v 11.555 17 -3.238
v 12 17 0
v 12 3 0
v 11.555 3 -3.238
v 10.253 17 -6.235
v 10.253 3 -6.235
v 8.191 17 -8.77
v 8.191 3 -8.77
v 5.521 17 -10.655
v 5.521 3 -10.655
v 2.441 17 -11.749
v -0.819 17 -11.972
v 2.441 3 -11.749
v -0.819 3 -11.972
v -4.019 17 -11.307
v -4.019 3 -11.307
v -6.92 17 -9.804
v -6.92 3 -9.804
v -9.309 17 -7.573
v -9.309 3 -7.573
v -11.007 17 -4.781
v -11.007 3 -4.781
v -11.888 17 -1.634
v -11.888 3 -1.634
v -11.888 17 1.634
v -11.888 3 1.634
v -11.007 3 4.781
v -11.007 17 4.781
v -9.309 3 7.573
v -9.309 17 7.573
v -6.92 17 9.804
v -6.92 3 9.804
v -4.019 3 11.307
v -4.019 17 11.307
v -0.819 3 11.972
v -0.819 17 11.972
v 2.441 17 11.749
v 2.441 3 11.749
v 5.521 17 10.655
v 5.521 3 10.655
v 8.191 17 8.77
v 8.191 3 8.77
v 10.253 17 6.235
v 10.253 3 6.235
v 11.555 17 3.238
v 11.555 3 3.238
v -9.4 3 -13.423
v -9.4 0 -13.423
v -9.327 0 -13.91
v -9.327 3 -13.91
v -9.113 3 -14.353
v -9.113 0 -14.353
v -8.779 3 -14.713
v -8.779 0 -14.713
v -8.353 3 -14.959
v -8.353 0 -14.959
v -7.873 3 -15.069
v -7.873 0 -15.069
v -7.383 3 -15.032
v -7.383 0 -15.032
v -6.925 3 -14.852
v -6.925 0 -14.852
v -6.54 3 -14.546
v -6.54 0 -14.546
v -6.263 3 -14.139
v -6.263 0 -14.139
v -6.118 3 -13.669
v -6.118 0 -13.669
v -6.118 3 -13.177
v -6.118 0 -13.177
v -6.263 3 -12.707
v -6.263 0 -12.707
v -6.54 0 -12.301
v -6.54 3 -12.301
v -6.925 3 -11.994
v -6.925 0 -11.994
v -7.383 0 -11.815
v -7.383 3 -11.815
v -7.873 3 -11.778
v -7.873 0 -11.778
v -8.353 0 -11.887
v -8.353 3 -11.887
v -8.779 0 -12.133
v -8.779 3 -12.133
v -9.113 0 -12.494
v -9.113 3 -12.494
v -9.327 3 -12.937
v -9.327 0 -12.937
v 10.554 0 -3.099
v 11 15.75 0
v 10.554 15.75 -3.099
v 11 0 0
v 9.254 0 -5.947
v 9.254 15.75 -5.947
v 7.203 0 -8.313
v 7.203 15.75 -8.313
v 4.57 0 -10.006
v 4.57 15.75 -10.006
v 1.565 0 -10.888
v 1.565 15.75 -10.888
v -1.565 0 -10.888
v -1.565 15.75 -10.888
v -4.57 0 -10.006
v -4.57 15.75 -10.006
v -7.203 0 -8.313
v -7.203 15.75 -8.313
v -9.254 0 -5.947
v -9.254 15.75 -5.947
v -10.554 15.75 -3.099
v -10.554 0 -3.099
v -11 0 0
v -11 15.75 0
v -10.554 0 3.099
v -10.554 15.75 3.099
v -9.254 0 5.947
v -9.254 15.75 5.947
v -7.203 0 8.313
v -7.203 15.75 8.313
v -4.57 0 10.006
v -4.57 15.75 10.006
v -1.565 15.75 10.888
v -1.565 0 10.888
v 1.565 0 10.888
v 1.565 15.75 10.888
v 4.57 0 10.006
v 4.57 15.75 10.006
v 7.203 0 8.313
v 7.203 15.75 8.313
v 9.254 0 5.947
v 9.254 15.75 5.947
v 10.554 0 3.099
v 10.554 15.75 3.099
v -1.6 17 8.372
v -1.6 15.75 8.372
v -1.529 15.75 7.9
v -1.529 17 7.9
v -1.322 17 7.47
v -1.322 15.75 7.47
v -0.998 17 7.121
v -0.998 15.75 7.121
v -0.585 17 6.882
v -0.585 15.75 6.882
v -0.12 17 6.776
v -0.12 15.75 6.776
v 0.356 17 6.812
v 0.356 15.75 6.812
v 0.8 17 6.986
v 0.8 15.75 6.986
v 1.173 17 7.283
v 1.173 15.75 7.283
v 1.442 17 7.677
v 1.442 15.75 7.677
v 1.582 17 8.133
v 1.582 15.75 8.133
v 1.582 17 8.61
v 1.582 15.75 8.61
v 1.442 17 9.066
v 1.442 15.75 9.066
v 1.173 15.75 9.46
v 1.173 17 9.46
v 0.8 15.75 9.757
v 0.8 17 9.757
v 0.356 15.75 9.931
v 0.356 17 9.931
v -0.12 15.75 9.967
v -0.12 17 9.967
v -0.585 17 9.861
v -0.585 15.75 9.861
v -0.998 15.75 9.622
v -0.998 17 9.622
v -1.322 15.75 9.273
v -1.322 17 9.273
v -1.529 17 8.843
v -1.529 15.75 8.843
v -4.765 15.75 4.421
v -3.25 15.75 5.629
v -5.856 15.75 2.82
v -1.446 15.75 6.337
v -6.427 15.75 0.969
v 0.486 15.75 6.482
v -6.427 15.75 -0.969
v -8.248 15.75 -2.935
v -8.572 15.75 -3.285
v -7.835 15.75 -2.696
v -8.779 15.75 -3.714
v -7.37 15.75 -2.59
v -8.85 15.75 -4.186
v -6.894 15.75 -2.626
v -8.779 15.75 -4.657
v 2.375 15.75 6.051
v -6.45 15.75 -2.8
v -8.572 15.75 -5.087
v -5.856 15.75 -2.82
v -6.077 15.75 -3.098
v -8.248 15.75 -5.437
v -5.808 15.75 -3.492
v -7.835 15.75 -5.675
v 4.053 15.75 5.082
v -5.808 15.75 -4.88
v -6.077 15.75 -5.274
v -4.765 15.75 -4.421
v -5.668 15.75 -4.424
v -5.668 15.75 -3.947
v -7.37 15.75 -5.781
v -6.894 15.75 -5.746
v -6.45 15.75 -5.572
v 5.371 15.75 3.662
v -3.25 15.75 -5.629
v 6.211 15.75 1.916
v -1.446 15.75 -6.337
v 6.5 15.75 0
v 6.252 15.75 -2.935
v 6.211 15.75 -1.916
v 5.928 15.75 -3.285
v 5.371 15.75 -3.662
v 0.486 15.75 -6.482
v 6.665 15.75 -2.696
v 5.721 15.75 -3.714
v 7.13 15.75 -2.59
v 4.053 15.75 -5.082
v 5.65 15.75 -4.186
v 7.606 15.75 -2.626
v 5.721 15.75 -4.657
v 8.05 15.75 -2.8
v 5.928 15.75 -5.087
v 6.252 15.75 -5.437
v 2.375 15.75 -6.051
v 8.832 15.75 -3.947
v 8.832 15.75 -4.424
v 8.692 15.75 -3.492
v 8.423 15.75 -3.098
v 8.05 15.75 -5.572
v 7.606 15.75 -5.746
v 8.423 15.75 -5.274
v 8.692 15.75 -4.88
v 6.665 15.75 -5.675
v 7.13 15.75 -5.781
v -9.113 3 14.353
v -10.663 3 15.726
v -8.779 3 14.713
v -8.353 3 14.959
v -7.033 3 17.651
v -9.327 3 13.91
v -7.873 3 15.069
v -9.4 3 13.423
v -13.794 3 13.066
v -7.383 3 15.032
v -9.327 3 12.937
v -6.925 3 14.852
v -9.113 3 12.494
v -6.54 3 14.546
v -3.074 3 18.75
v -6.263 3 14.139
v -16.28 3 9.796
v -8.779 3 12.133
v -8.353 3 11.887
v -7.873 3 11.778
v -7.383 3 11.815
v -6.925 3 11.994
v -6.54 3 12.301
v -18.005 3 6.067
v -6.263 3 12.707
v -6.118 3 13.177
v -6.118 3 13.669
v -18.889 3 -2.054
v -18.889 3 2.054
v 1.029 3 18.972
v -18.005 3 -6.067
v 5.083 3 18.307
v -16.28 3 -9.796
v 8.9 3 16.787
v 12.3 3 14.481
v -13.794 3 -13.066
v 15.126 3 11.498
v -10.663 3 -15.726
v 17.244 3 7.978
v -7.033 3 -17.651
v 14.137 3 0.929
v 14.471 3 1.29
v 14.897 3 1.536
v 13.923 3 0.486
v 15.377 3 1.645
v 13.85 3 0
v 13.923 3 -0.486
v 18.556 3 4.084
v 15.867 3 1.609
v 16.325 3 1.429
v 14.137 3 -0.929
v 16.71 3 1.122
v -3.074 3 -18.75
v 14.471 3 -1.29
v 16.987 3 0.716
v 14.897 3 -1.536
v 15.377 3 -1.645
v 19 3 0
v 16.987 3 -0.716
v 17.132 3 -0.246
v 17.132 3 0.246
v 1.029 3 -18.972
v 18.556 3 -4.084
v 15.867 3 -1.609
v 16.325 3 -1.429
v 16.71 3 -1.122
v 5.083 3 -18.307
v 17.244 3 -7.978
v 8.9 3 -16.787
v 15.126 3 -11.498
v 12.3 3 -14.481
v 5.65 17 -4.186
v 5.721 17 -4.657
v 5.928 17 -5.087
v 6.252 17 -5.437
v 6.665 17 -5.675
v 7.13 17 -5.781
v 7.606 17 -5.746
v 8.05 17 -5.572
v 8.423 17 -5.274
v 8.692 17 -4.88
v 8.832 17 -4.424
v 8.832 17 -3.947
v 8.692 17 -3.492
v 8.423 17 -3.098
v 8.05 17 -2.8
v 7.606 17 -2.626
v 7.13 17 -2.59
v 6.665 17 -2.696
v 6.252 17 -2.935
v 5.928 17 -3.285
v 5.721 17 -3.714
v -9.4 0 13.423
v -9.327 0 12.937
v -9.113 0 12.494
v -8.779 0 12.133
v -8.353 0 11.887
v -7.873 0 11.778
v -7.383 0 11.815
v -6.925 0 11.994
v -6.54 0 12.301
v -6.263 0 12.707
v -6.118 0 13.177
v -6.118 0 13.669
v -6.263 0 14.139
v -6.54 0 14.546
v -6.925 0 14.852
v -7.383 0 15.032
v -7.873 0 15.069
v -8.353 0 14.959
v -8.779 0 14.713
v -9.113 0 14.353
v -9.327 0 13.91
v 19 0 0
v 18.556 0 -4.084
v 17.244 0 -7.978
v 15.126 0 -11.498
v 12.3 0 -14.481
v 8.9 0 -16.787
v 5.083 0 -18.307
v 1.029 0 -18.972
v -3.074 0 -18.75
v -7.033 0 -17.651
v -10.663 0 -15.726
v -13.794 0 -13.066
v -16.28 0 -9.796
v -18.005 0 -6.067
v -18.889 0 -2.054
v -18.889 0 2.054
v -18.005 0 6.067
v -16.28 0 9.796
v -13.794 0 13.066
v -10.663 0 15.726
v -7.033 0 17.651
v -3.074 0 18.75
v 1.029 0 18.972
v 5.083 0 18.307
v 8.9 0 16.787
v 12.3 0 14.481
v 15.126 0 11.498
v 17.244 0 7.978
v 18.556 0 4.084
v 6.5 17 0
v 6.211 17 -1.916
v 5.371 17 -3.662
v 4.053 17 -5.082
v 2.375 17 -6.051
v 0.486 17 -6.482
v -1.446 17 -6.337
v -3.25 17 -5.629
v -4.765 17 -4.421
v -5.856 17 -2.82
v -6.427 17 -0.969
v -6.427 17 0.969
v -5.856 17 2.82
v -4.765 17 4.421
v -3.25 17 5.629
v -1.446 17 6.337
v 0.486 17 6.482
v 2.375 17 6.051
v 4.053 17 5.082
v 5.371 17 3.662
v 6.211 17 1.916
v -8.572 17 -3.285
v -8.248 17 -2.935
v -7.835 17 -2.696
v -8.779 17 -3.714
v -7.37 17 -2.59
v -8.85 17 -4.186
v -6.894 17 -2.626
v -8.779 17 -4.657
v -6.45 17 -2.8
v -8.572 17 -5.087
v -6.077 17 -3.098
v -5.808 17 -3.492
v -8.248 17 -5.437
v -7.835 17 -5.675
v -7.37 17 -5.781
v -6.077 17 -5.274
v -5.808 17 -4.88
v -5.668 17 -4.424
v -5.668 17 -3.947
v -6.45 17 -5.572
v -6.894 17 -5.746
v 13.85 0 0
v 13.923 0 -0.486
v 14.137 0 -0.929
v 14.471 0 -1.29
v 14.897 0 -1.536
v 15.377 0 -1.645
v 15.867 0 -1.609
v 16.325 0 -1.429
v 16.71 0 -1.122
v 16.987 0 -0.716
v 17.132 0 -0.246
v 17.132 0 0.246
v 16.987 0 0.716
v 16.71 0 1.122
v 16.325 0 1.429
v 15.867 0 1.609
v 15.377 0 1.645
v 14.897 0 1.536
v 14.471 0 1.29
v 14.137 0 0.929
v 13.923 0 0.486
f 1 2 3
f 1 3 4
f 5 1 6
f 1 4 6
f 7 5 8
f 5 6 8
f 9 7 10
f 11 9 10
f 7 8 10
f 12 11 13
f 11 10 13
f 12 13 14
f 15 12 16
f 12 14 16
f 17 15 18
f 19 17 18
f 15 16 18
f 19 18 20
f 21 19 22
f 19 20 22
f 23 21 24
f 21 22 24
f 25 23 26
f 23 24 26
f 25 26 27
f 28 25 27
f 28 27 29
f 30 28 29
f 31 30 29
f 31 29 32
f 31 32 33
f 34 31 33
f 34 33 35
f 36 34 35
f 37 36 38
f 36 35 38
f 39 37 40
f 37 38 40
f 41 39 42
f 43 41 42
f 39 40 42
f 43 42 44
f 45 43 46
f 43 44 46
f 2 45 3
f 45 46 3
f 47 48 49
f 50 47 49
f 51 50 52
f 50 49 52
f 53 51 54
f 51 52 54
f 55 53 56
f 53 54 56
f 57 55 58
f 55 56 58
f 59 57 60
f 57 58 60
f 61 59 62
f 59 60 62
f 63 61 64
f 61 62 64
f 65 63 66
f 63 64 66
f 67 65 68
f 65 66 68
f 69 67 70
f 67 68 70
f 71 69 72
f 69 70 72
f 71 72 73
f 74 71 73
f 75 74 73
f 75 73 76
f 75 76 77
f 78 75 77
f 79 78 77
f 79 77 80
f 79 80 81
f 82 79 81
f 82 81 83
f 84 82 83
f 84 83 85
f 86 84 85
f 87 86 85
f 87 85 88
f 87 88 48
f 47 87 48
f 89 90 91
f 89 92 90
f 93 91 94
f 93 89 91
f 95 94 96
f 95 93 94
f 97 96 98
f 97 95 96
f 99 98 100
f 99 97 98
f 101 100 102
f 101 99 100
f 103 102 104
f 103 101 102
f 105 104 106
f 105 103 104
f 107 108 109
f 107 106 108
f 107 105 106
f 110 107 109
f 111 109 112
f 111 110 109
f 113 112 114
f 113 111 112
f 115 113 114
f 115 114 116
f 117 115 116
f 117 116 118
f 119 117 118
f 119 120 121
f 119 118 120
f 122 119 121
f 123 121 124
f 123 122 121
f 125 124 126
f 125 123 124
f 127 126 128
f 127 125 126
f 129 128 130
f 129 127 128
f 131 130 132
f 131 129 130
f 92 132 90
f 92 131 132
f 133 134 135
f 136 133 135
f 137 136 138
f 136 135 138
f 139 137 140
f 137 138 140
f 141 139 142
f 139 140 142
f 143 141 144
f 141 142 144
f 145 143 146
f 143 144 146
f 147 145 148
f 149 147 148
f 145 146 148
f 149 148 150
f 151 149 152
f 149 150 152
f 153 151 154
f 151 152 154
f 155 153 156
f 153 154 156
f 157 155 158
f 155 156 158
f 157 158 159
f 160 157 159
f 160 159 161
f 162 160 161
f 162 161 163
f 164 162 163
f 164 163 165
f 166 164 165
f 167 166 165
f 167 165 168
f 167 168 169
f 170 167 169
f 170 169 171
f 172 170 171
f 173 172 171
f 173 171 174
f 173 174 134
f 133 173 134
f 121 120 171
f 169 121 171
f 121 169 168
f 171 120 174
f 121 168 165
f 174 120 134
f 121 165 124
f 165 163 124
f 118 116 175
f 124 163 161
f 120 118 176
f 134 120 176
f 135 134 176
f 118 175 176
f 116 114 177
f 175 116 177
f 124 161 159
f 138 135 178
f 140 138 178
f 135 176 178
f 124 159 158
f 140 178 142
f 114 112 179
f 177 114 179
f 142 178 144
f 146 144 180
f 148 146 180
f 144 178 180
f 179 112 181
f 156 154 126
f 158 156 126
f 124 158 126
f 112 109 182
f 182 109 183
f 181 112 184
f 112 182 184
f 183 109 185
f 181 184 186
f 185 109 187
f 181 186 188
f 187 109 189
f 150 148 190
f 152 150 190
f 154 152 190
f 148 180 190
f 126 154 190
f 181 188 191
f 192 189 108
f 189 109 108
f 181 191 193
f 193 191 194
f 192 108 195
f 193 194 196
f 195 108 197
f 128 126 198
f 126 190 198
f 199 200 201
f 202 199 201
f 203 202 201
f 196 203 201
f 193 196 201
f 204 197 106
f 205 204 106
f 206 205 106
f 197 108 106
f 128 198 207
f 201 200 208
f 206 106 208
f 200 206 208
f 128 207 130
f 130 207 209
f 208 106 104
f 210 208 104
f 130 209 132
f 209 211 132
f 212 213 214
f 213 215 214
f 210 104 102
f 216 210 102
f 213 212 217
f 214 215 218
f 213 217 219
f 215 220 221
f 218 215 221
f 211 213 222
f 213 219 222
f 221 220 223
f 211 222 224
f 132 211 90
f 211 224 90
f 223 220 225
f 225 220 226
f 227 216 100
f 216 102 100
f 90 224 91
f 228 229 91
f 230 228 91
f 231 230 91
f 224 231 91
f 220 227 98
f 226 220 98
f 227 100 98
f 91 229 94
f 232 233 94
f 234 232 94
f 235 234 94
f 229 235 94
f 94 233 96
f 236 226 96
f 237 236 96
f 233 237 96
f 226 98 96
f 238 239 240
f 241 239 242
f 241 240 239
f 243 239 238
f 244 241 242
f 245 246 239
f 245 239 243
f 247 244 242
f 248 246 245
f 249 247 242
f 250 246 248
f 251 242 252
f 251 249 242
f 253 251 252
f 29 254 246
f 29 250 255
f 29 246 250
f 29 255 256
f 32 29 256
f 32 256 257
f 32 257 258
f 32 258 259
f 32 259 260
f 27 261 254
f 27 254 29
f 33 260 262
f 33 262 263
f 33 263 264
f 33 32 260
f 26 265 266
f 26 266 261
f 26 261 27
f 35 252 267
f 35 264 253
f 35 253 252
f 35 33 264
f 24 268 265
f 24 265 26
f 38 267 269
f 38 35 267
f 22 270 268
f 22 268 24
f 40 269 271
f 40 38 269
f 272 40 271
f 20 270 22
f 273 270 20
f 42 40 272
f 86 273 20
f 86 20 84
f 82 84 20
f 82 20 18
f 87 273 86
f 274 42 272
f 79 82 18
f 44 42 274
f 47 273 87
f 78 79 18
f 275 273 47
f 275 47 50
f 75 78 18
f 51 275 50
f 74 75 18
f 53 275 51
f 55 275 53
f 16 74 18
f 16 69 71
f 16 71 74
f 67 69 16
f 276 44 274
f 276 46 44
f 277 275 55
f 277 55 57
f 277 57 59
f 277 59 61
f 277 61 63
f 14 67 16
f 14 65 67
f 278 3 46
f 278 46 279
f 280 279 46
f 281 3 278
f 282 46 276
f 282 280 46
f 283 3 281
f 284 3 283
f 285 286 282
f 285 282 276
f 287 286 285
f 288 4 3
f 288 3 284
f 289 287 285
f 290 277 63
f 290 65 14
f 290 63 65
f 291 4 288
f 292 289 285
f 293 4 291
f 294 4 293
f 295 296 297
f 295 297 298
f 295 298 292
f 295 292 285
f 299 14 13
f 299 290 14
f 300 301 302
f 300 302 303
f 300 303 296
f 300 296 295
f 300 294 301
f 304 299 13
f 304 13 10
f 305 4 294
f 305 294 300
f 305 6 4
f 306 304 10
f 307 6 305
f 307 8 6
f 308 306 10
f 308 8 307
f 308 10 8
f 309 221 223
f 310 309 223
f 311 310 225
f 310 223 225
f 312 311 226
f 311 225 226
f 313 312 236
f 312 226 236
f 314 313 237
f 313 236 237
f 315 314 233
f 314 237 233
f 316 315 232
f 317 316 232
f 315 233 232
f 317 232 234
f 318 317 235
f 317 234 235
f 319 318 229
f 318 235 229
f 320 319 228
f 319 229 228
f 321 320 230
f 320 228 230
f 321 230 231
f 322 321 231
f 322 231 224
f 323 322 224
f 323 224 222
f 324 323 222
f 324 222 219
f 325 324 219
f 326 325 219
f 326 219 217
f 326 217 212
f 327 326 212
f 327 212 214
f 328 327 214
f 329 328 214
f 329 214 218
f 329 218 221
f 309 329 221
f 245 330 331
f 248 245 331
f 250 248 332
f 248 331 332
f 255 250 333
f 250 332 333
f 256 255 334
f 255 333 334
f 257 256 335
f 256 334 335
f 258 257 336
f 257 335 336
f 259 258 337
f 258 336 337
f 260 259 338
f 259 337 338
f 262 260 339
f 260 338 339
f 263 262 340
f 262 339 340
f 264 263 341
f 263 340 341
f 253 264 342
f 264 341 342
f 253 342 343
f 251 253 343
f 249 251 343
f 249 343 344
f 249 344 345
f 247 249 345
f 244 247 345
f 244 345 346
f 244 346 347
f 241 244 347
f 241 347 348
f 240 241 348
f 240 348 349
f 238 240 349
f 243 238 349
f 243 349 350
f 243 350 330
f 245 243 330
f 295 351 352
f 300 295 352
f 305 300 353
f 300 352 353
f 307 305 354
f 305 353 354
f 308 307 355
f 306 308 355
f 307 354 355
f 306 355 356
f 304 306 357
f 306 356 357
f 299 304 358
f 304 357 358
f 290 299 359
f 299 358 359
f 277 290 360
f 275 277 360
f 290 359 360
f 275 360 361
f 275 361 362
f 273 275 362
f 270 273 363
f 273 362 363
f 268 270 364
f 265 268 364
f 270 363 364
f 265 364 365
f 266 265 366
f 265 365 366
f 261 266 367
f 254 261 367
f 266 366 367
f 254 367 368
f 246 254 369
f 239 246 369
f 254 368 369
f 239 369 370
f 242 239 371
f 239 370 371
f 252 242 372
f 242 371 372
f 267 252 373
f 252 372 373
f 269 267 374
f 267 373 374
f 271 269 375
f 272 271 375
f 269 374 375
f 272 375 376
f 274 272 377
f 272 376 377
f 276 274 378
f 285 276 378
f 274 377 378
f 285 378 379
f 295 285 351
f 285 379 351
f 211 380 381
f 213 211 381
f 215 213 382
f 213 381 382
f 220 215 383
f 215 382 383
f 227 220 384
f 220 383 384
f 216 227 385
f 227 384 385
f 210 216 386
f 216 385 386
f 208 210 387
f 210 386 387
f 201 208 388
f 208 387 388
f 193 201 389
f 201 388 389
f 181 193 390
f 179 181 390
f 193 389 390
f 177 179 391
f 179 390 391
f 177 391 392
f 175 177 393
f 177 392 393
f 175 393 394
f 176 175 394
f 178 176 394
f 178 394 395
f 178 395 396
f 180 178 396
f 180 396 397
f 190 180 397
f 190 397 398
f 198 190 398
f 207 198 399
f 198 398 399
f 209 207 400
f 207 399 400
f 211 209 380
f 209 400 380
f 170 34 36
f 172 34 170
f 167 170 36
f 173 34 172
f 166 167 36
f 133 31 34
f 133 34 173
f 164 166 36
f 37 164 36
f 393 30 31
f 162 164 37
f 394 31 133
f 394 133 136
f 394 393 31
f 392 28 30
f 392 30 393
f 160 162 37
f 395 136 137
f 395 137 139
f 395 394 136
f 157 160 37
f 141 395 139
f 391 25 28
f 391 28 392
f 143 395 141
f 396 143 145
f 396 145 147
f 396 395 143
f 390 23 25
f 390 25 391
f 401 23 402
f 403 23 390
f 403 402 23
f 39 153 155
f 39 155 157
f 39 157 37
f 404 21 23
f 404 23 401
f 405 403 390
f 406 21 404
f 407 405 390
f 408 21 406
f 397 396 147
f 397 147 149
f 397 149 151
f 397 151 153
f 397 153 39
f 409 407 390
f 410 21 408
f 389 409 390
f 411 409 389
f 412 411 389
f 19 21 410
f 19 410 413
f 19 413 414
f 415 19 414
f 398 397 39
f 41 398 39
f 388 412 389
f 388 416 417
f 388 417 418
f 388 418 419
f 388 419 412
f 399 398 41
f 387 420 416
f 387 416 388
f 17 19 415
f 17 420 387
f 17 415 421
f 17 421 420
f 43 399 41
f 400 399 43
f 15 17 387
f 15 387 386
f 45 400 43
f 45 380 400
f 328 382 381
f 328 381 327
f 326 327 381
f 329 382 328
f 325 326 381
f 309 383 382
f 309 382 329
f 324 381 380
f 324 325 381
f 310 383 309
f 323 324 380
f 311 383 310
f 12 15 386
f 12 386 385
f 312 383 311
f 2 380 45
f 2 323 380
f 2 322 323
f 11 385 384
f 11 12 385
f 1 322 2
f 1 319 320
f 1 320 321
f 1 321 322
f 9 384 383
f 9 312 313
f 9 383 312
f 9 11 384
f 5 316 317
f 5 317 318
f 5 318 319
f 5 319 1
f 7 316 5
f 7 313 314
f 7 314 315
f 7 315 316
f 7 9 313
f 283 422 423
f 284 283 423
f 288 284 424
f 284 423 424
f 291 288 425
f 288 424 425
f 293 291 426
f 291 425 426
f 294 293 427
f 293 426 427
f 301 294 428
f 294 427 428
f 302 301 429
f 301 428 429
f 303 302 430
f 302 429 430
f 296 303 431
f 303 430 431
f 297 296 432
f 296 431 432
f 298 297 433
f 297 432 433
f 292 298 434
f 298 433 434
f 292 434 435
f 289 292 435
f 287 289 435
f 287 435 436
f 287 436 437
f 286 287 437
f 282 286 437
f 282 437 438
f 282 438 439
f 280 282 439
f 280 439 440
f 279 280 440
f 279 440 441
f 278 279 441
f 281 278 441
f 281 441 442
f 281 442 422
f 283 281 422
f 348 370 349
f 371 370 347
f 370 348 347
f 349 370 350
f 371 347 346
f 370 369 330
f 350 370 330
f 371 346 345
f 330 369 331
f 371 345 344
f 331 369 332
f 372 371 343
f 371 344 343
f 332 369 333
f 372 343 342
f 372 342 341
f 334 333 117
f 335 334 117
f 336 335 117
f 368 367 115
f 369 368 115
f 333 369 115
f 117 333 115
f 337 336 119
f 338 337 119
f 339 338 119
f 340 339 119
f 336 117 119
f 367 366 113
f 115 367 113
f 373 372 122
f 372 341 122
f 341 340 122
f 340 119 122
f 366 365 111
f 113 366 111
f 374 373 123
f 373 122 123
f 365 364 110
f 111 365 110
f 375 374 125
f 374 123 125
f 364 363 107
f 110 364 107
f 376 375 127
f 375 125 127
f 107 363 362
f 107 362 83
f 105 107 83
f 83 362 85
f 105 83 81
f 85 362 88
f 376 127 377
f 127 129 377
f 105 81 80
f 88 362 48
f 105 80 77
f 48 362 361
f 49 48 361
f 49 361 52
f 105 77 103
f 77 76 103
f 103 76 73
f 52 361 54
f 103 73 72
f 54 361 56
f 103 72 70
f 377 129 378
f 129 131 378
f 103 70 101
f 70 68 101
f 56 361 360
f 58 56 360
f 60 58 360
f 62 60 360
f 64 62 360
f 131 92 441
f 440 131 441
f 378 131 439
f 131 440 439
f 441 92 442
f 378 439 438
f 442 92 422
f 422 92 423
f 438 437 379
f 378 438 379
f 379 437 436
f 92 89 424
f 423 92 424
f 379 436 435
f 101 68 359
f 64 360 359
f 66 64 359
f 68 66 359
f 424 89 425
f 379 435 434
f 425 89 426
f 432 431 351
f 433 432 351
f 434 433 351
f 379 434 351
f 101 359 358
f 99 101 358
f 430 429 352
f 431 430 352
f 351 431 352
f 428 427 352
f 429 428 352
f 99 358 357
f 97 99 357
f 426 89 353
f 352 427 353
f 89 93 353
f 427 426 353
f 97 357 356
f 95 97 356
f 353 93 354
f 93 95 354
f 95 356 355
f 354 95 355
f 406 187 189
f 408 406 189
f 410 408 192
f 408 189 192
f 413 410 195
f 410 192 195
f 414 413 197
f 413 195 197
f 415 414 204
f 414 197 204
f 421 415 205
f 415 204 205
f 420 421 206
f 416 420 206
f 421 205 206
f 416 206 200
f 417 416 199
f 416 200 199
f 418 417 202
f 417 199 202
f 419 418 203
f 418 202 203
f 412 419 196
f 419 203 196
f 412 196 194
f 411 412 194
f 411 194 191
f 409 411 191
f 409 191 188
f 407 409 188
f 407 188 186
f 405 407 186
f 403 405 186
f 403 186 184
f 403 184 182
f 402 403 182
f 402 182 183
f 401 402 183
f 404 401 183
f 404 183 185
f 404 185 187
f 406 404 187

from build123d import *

# Parameters (mm, degrees)
SKETCH1_R                 = 19
SKETCH1_R_2               = 11
BOSS_EXTRUDE1_DEPTH       = 3
SKETCH2_R                 = 12
SKETCH2_R_2               = 11
BOSS_EXTRUDE2_DEPTH       = 14
SKETCH3_R                 = 12
SKETCH3_R_2               = 6.5
BOSS_EXTRUDE3_DEPTH       = 1.25
M3_CLEARANCE_HOLE1_D      = 3.2
M3_CLEARANCE_HOLE1_DEPTH  = 7.5
M3_CLEARANCE_HOLE1_TIP    = 0.96137699
M4X0_7_TAPPED_HOLE1_D     = 3.3
M4X0_7_TAPPED_HOLE1_DEPTH = 3


with BuildPart() as part:
    # Sketch1 → Boss-Extrude1 (new body)
    with BuildSketch(Plane(origin=(0, 0, 0), x_dir=(1, 0, 0), z_dir=(0, 1, 0))):
        Circle(SKETCH1_R)
        Circle(SKETCH1_R_2, mode=Mode.SUBTRACT)
    extrude(amount=BOSS_EXTRUDE1_DEPTH)

    # Sketch2 → Boss-Extrude2 (add)
    with BuildSketch(Plane(origin=(0, 3, 0), x_dir=(1, 0, 0), z_dir=(0, 1, 0))):
        Circle(SKETCH2_R)
        Circle(SKETCH2_R_2, mode=Mode.SUBTRACT)
    extrude(amount=BOSS_EXTRUDE2_DEPTH)

    # Sketch3 → Boss-Extrude3 (add)
    with BuildSketch(Plane(origin=(0, 17, 0), x_dir=(1, 0, 0), z_dir=(0, 1, 0))):
        Circle(SKETCH3_R)
        Circle(SKETCH3_R_2, mode=Mode.SUBTRACT)
    extrude(amount=-BOSS_EXTRUDE3_DEPTH)

    # M3 Clearance Hole1
    with Locations(Plane(origin=(0, 17, 0), x_dir=(1, 0, 0), z_dir=(0, 1, 0))):
        with Locations((-7.25, 4.185868355), (7.25, 4.185868355), (0, -8.3715)):
            Hole(M3_CLEARANCE_HOLE1_D / 2, depth=M3_CLEARANCE_HOLE1_DEPTH)
            with Locations((0, 0, -(M3_CLEARANCE_HOLE1_DEPTH + M3_CLEARANCE_HOLE1_TIP / 2))):  # 118° drill point
                Cone(0, M3_CLEARANCE_HOLE1_D / 2, M3_CLEARANCE_HOLE1_TIP, mode=Mode.SUBTRACT)

    # M4x0.7 Tapped Hole1
    with Locations(Plane(origin=(0, 3, 0), x_dir=(1, 0, 0), z_dir=(0, 1, 0))):
        with Locations((-7.75, 13.423393759), (-7.75, -13.423393759), (15.5, 0)):
            Hole(M4X0_7_TAPPED_HOLE1_D / 2, depth=M4X0_7_TAPPED_HOLE1_DEPTH)


solid = part.part
